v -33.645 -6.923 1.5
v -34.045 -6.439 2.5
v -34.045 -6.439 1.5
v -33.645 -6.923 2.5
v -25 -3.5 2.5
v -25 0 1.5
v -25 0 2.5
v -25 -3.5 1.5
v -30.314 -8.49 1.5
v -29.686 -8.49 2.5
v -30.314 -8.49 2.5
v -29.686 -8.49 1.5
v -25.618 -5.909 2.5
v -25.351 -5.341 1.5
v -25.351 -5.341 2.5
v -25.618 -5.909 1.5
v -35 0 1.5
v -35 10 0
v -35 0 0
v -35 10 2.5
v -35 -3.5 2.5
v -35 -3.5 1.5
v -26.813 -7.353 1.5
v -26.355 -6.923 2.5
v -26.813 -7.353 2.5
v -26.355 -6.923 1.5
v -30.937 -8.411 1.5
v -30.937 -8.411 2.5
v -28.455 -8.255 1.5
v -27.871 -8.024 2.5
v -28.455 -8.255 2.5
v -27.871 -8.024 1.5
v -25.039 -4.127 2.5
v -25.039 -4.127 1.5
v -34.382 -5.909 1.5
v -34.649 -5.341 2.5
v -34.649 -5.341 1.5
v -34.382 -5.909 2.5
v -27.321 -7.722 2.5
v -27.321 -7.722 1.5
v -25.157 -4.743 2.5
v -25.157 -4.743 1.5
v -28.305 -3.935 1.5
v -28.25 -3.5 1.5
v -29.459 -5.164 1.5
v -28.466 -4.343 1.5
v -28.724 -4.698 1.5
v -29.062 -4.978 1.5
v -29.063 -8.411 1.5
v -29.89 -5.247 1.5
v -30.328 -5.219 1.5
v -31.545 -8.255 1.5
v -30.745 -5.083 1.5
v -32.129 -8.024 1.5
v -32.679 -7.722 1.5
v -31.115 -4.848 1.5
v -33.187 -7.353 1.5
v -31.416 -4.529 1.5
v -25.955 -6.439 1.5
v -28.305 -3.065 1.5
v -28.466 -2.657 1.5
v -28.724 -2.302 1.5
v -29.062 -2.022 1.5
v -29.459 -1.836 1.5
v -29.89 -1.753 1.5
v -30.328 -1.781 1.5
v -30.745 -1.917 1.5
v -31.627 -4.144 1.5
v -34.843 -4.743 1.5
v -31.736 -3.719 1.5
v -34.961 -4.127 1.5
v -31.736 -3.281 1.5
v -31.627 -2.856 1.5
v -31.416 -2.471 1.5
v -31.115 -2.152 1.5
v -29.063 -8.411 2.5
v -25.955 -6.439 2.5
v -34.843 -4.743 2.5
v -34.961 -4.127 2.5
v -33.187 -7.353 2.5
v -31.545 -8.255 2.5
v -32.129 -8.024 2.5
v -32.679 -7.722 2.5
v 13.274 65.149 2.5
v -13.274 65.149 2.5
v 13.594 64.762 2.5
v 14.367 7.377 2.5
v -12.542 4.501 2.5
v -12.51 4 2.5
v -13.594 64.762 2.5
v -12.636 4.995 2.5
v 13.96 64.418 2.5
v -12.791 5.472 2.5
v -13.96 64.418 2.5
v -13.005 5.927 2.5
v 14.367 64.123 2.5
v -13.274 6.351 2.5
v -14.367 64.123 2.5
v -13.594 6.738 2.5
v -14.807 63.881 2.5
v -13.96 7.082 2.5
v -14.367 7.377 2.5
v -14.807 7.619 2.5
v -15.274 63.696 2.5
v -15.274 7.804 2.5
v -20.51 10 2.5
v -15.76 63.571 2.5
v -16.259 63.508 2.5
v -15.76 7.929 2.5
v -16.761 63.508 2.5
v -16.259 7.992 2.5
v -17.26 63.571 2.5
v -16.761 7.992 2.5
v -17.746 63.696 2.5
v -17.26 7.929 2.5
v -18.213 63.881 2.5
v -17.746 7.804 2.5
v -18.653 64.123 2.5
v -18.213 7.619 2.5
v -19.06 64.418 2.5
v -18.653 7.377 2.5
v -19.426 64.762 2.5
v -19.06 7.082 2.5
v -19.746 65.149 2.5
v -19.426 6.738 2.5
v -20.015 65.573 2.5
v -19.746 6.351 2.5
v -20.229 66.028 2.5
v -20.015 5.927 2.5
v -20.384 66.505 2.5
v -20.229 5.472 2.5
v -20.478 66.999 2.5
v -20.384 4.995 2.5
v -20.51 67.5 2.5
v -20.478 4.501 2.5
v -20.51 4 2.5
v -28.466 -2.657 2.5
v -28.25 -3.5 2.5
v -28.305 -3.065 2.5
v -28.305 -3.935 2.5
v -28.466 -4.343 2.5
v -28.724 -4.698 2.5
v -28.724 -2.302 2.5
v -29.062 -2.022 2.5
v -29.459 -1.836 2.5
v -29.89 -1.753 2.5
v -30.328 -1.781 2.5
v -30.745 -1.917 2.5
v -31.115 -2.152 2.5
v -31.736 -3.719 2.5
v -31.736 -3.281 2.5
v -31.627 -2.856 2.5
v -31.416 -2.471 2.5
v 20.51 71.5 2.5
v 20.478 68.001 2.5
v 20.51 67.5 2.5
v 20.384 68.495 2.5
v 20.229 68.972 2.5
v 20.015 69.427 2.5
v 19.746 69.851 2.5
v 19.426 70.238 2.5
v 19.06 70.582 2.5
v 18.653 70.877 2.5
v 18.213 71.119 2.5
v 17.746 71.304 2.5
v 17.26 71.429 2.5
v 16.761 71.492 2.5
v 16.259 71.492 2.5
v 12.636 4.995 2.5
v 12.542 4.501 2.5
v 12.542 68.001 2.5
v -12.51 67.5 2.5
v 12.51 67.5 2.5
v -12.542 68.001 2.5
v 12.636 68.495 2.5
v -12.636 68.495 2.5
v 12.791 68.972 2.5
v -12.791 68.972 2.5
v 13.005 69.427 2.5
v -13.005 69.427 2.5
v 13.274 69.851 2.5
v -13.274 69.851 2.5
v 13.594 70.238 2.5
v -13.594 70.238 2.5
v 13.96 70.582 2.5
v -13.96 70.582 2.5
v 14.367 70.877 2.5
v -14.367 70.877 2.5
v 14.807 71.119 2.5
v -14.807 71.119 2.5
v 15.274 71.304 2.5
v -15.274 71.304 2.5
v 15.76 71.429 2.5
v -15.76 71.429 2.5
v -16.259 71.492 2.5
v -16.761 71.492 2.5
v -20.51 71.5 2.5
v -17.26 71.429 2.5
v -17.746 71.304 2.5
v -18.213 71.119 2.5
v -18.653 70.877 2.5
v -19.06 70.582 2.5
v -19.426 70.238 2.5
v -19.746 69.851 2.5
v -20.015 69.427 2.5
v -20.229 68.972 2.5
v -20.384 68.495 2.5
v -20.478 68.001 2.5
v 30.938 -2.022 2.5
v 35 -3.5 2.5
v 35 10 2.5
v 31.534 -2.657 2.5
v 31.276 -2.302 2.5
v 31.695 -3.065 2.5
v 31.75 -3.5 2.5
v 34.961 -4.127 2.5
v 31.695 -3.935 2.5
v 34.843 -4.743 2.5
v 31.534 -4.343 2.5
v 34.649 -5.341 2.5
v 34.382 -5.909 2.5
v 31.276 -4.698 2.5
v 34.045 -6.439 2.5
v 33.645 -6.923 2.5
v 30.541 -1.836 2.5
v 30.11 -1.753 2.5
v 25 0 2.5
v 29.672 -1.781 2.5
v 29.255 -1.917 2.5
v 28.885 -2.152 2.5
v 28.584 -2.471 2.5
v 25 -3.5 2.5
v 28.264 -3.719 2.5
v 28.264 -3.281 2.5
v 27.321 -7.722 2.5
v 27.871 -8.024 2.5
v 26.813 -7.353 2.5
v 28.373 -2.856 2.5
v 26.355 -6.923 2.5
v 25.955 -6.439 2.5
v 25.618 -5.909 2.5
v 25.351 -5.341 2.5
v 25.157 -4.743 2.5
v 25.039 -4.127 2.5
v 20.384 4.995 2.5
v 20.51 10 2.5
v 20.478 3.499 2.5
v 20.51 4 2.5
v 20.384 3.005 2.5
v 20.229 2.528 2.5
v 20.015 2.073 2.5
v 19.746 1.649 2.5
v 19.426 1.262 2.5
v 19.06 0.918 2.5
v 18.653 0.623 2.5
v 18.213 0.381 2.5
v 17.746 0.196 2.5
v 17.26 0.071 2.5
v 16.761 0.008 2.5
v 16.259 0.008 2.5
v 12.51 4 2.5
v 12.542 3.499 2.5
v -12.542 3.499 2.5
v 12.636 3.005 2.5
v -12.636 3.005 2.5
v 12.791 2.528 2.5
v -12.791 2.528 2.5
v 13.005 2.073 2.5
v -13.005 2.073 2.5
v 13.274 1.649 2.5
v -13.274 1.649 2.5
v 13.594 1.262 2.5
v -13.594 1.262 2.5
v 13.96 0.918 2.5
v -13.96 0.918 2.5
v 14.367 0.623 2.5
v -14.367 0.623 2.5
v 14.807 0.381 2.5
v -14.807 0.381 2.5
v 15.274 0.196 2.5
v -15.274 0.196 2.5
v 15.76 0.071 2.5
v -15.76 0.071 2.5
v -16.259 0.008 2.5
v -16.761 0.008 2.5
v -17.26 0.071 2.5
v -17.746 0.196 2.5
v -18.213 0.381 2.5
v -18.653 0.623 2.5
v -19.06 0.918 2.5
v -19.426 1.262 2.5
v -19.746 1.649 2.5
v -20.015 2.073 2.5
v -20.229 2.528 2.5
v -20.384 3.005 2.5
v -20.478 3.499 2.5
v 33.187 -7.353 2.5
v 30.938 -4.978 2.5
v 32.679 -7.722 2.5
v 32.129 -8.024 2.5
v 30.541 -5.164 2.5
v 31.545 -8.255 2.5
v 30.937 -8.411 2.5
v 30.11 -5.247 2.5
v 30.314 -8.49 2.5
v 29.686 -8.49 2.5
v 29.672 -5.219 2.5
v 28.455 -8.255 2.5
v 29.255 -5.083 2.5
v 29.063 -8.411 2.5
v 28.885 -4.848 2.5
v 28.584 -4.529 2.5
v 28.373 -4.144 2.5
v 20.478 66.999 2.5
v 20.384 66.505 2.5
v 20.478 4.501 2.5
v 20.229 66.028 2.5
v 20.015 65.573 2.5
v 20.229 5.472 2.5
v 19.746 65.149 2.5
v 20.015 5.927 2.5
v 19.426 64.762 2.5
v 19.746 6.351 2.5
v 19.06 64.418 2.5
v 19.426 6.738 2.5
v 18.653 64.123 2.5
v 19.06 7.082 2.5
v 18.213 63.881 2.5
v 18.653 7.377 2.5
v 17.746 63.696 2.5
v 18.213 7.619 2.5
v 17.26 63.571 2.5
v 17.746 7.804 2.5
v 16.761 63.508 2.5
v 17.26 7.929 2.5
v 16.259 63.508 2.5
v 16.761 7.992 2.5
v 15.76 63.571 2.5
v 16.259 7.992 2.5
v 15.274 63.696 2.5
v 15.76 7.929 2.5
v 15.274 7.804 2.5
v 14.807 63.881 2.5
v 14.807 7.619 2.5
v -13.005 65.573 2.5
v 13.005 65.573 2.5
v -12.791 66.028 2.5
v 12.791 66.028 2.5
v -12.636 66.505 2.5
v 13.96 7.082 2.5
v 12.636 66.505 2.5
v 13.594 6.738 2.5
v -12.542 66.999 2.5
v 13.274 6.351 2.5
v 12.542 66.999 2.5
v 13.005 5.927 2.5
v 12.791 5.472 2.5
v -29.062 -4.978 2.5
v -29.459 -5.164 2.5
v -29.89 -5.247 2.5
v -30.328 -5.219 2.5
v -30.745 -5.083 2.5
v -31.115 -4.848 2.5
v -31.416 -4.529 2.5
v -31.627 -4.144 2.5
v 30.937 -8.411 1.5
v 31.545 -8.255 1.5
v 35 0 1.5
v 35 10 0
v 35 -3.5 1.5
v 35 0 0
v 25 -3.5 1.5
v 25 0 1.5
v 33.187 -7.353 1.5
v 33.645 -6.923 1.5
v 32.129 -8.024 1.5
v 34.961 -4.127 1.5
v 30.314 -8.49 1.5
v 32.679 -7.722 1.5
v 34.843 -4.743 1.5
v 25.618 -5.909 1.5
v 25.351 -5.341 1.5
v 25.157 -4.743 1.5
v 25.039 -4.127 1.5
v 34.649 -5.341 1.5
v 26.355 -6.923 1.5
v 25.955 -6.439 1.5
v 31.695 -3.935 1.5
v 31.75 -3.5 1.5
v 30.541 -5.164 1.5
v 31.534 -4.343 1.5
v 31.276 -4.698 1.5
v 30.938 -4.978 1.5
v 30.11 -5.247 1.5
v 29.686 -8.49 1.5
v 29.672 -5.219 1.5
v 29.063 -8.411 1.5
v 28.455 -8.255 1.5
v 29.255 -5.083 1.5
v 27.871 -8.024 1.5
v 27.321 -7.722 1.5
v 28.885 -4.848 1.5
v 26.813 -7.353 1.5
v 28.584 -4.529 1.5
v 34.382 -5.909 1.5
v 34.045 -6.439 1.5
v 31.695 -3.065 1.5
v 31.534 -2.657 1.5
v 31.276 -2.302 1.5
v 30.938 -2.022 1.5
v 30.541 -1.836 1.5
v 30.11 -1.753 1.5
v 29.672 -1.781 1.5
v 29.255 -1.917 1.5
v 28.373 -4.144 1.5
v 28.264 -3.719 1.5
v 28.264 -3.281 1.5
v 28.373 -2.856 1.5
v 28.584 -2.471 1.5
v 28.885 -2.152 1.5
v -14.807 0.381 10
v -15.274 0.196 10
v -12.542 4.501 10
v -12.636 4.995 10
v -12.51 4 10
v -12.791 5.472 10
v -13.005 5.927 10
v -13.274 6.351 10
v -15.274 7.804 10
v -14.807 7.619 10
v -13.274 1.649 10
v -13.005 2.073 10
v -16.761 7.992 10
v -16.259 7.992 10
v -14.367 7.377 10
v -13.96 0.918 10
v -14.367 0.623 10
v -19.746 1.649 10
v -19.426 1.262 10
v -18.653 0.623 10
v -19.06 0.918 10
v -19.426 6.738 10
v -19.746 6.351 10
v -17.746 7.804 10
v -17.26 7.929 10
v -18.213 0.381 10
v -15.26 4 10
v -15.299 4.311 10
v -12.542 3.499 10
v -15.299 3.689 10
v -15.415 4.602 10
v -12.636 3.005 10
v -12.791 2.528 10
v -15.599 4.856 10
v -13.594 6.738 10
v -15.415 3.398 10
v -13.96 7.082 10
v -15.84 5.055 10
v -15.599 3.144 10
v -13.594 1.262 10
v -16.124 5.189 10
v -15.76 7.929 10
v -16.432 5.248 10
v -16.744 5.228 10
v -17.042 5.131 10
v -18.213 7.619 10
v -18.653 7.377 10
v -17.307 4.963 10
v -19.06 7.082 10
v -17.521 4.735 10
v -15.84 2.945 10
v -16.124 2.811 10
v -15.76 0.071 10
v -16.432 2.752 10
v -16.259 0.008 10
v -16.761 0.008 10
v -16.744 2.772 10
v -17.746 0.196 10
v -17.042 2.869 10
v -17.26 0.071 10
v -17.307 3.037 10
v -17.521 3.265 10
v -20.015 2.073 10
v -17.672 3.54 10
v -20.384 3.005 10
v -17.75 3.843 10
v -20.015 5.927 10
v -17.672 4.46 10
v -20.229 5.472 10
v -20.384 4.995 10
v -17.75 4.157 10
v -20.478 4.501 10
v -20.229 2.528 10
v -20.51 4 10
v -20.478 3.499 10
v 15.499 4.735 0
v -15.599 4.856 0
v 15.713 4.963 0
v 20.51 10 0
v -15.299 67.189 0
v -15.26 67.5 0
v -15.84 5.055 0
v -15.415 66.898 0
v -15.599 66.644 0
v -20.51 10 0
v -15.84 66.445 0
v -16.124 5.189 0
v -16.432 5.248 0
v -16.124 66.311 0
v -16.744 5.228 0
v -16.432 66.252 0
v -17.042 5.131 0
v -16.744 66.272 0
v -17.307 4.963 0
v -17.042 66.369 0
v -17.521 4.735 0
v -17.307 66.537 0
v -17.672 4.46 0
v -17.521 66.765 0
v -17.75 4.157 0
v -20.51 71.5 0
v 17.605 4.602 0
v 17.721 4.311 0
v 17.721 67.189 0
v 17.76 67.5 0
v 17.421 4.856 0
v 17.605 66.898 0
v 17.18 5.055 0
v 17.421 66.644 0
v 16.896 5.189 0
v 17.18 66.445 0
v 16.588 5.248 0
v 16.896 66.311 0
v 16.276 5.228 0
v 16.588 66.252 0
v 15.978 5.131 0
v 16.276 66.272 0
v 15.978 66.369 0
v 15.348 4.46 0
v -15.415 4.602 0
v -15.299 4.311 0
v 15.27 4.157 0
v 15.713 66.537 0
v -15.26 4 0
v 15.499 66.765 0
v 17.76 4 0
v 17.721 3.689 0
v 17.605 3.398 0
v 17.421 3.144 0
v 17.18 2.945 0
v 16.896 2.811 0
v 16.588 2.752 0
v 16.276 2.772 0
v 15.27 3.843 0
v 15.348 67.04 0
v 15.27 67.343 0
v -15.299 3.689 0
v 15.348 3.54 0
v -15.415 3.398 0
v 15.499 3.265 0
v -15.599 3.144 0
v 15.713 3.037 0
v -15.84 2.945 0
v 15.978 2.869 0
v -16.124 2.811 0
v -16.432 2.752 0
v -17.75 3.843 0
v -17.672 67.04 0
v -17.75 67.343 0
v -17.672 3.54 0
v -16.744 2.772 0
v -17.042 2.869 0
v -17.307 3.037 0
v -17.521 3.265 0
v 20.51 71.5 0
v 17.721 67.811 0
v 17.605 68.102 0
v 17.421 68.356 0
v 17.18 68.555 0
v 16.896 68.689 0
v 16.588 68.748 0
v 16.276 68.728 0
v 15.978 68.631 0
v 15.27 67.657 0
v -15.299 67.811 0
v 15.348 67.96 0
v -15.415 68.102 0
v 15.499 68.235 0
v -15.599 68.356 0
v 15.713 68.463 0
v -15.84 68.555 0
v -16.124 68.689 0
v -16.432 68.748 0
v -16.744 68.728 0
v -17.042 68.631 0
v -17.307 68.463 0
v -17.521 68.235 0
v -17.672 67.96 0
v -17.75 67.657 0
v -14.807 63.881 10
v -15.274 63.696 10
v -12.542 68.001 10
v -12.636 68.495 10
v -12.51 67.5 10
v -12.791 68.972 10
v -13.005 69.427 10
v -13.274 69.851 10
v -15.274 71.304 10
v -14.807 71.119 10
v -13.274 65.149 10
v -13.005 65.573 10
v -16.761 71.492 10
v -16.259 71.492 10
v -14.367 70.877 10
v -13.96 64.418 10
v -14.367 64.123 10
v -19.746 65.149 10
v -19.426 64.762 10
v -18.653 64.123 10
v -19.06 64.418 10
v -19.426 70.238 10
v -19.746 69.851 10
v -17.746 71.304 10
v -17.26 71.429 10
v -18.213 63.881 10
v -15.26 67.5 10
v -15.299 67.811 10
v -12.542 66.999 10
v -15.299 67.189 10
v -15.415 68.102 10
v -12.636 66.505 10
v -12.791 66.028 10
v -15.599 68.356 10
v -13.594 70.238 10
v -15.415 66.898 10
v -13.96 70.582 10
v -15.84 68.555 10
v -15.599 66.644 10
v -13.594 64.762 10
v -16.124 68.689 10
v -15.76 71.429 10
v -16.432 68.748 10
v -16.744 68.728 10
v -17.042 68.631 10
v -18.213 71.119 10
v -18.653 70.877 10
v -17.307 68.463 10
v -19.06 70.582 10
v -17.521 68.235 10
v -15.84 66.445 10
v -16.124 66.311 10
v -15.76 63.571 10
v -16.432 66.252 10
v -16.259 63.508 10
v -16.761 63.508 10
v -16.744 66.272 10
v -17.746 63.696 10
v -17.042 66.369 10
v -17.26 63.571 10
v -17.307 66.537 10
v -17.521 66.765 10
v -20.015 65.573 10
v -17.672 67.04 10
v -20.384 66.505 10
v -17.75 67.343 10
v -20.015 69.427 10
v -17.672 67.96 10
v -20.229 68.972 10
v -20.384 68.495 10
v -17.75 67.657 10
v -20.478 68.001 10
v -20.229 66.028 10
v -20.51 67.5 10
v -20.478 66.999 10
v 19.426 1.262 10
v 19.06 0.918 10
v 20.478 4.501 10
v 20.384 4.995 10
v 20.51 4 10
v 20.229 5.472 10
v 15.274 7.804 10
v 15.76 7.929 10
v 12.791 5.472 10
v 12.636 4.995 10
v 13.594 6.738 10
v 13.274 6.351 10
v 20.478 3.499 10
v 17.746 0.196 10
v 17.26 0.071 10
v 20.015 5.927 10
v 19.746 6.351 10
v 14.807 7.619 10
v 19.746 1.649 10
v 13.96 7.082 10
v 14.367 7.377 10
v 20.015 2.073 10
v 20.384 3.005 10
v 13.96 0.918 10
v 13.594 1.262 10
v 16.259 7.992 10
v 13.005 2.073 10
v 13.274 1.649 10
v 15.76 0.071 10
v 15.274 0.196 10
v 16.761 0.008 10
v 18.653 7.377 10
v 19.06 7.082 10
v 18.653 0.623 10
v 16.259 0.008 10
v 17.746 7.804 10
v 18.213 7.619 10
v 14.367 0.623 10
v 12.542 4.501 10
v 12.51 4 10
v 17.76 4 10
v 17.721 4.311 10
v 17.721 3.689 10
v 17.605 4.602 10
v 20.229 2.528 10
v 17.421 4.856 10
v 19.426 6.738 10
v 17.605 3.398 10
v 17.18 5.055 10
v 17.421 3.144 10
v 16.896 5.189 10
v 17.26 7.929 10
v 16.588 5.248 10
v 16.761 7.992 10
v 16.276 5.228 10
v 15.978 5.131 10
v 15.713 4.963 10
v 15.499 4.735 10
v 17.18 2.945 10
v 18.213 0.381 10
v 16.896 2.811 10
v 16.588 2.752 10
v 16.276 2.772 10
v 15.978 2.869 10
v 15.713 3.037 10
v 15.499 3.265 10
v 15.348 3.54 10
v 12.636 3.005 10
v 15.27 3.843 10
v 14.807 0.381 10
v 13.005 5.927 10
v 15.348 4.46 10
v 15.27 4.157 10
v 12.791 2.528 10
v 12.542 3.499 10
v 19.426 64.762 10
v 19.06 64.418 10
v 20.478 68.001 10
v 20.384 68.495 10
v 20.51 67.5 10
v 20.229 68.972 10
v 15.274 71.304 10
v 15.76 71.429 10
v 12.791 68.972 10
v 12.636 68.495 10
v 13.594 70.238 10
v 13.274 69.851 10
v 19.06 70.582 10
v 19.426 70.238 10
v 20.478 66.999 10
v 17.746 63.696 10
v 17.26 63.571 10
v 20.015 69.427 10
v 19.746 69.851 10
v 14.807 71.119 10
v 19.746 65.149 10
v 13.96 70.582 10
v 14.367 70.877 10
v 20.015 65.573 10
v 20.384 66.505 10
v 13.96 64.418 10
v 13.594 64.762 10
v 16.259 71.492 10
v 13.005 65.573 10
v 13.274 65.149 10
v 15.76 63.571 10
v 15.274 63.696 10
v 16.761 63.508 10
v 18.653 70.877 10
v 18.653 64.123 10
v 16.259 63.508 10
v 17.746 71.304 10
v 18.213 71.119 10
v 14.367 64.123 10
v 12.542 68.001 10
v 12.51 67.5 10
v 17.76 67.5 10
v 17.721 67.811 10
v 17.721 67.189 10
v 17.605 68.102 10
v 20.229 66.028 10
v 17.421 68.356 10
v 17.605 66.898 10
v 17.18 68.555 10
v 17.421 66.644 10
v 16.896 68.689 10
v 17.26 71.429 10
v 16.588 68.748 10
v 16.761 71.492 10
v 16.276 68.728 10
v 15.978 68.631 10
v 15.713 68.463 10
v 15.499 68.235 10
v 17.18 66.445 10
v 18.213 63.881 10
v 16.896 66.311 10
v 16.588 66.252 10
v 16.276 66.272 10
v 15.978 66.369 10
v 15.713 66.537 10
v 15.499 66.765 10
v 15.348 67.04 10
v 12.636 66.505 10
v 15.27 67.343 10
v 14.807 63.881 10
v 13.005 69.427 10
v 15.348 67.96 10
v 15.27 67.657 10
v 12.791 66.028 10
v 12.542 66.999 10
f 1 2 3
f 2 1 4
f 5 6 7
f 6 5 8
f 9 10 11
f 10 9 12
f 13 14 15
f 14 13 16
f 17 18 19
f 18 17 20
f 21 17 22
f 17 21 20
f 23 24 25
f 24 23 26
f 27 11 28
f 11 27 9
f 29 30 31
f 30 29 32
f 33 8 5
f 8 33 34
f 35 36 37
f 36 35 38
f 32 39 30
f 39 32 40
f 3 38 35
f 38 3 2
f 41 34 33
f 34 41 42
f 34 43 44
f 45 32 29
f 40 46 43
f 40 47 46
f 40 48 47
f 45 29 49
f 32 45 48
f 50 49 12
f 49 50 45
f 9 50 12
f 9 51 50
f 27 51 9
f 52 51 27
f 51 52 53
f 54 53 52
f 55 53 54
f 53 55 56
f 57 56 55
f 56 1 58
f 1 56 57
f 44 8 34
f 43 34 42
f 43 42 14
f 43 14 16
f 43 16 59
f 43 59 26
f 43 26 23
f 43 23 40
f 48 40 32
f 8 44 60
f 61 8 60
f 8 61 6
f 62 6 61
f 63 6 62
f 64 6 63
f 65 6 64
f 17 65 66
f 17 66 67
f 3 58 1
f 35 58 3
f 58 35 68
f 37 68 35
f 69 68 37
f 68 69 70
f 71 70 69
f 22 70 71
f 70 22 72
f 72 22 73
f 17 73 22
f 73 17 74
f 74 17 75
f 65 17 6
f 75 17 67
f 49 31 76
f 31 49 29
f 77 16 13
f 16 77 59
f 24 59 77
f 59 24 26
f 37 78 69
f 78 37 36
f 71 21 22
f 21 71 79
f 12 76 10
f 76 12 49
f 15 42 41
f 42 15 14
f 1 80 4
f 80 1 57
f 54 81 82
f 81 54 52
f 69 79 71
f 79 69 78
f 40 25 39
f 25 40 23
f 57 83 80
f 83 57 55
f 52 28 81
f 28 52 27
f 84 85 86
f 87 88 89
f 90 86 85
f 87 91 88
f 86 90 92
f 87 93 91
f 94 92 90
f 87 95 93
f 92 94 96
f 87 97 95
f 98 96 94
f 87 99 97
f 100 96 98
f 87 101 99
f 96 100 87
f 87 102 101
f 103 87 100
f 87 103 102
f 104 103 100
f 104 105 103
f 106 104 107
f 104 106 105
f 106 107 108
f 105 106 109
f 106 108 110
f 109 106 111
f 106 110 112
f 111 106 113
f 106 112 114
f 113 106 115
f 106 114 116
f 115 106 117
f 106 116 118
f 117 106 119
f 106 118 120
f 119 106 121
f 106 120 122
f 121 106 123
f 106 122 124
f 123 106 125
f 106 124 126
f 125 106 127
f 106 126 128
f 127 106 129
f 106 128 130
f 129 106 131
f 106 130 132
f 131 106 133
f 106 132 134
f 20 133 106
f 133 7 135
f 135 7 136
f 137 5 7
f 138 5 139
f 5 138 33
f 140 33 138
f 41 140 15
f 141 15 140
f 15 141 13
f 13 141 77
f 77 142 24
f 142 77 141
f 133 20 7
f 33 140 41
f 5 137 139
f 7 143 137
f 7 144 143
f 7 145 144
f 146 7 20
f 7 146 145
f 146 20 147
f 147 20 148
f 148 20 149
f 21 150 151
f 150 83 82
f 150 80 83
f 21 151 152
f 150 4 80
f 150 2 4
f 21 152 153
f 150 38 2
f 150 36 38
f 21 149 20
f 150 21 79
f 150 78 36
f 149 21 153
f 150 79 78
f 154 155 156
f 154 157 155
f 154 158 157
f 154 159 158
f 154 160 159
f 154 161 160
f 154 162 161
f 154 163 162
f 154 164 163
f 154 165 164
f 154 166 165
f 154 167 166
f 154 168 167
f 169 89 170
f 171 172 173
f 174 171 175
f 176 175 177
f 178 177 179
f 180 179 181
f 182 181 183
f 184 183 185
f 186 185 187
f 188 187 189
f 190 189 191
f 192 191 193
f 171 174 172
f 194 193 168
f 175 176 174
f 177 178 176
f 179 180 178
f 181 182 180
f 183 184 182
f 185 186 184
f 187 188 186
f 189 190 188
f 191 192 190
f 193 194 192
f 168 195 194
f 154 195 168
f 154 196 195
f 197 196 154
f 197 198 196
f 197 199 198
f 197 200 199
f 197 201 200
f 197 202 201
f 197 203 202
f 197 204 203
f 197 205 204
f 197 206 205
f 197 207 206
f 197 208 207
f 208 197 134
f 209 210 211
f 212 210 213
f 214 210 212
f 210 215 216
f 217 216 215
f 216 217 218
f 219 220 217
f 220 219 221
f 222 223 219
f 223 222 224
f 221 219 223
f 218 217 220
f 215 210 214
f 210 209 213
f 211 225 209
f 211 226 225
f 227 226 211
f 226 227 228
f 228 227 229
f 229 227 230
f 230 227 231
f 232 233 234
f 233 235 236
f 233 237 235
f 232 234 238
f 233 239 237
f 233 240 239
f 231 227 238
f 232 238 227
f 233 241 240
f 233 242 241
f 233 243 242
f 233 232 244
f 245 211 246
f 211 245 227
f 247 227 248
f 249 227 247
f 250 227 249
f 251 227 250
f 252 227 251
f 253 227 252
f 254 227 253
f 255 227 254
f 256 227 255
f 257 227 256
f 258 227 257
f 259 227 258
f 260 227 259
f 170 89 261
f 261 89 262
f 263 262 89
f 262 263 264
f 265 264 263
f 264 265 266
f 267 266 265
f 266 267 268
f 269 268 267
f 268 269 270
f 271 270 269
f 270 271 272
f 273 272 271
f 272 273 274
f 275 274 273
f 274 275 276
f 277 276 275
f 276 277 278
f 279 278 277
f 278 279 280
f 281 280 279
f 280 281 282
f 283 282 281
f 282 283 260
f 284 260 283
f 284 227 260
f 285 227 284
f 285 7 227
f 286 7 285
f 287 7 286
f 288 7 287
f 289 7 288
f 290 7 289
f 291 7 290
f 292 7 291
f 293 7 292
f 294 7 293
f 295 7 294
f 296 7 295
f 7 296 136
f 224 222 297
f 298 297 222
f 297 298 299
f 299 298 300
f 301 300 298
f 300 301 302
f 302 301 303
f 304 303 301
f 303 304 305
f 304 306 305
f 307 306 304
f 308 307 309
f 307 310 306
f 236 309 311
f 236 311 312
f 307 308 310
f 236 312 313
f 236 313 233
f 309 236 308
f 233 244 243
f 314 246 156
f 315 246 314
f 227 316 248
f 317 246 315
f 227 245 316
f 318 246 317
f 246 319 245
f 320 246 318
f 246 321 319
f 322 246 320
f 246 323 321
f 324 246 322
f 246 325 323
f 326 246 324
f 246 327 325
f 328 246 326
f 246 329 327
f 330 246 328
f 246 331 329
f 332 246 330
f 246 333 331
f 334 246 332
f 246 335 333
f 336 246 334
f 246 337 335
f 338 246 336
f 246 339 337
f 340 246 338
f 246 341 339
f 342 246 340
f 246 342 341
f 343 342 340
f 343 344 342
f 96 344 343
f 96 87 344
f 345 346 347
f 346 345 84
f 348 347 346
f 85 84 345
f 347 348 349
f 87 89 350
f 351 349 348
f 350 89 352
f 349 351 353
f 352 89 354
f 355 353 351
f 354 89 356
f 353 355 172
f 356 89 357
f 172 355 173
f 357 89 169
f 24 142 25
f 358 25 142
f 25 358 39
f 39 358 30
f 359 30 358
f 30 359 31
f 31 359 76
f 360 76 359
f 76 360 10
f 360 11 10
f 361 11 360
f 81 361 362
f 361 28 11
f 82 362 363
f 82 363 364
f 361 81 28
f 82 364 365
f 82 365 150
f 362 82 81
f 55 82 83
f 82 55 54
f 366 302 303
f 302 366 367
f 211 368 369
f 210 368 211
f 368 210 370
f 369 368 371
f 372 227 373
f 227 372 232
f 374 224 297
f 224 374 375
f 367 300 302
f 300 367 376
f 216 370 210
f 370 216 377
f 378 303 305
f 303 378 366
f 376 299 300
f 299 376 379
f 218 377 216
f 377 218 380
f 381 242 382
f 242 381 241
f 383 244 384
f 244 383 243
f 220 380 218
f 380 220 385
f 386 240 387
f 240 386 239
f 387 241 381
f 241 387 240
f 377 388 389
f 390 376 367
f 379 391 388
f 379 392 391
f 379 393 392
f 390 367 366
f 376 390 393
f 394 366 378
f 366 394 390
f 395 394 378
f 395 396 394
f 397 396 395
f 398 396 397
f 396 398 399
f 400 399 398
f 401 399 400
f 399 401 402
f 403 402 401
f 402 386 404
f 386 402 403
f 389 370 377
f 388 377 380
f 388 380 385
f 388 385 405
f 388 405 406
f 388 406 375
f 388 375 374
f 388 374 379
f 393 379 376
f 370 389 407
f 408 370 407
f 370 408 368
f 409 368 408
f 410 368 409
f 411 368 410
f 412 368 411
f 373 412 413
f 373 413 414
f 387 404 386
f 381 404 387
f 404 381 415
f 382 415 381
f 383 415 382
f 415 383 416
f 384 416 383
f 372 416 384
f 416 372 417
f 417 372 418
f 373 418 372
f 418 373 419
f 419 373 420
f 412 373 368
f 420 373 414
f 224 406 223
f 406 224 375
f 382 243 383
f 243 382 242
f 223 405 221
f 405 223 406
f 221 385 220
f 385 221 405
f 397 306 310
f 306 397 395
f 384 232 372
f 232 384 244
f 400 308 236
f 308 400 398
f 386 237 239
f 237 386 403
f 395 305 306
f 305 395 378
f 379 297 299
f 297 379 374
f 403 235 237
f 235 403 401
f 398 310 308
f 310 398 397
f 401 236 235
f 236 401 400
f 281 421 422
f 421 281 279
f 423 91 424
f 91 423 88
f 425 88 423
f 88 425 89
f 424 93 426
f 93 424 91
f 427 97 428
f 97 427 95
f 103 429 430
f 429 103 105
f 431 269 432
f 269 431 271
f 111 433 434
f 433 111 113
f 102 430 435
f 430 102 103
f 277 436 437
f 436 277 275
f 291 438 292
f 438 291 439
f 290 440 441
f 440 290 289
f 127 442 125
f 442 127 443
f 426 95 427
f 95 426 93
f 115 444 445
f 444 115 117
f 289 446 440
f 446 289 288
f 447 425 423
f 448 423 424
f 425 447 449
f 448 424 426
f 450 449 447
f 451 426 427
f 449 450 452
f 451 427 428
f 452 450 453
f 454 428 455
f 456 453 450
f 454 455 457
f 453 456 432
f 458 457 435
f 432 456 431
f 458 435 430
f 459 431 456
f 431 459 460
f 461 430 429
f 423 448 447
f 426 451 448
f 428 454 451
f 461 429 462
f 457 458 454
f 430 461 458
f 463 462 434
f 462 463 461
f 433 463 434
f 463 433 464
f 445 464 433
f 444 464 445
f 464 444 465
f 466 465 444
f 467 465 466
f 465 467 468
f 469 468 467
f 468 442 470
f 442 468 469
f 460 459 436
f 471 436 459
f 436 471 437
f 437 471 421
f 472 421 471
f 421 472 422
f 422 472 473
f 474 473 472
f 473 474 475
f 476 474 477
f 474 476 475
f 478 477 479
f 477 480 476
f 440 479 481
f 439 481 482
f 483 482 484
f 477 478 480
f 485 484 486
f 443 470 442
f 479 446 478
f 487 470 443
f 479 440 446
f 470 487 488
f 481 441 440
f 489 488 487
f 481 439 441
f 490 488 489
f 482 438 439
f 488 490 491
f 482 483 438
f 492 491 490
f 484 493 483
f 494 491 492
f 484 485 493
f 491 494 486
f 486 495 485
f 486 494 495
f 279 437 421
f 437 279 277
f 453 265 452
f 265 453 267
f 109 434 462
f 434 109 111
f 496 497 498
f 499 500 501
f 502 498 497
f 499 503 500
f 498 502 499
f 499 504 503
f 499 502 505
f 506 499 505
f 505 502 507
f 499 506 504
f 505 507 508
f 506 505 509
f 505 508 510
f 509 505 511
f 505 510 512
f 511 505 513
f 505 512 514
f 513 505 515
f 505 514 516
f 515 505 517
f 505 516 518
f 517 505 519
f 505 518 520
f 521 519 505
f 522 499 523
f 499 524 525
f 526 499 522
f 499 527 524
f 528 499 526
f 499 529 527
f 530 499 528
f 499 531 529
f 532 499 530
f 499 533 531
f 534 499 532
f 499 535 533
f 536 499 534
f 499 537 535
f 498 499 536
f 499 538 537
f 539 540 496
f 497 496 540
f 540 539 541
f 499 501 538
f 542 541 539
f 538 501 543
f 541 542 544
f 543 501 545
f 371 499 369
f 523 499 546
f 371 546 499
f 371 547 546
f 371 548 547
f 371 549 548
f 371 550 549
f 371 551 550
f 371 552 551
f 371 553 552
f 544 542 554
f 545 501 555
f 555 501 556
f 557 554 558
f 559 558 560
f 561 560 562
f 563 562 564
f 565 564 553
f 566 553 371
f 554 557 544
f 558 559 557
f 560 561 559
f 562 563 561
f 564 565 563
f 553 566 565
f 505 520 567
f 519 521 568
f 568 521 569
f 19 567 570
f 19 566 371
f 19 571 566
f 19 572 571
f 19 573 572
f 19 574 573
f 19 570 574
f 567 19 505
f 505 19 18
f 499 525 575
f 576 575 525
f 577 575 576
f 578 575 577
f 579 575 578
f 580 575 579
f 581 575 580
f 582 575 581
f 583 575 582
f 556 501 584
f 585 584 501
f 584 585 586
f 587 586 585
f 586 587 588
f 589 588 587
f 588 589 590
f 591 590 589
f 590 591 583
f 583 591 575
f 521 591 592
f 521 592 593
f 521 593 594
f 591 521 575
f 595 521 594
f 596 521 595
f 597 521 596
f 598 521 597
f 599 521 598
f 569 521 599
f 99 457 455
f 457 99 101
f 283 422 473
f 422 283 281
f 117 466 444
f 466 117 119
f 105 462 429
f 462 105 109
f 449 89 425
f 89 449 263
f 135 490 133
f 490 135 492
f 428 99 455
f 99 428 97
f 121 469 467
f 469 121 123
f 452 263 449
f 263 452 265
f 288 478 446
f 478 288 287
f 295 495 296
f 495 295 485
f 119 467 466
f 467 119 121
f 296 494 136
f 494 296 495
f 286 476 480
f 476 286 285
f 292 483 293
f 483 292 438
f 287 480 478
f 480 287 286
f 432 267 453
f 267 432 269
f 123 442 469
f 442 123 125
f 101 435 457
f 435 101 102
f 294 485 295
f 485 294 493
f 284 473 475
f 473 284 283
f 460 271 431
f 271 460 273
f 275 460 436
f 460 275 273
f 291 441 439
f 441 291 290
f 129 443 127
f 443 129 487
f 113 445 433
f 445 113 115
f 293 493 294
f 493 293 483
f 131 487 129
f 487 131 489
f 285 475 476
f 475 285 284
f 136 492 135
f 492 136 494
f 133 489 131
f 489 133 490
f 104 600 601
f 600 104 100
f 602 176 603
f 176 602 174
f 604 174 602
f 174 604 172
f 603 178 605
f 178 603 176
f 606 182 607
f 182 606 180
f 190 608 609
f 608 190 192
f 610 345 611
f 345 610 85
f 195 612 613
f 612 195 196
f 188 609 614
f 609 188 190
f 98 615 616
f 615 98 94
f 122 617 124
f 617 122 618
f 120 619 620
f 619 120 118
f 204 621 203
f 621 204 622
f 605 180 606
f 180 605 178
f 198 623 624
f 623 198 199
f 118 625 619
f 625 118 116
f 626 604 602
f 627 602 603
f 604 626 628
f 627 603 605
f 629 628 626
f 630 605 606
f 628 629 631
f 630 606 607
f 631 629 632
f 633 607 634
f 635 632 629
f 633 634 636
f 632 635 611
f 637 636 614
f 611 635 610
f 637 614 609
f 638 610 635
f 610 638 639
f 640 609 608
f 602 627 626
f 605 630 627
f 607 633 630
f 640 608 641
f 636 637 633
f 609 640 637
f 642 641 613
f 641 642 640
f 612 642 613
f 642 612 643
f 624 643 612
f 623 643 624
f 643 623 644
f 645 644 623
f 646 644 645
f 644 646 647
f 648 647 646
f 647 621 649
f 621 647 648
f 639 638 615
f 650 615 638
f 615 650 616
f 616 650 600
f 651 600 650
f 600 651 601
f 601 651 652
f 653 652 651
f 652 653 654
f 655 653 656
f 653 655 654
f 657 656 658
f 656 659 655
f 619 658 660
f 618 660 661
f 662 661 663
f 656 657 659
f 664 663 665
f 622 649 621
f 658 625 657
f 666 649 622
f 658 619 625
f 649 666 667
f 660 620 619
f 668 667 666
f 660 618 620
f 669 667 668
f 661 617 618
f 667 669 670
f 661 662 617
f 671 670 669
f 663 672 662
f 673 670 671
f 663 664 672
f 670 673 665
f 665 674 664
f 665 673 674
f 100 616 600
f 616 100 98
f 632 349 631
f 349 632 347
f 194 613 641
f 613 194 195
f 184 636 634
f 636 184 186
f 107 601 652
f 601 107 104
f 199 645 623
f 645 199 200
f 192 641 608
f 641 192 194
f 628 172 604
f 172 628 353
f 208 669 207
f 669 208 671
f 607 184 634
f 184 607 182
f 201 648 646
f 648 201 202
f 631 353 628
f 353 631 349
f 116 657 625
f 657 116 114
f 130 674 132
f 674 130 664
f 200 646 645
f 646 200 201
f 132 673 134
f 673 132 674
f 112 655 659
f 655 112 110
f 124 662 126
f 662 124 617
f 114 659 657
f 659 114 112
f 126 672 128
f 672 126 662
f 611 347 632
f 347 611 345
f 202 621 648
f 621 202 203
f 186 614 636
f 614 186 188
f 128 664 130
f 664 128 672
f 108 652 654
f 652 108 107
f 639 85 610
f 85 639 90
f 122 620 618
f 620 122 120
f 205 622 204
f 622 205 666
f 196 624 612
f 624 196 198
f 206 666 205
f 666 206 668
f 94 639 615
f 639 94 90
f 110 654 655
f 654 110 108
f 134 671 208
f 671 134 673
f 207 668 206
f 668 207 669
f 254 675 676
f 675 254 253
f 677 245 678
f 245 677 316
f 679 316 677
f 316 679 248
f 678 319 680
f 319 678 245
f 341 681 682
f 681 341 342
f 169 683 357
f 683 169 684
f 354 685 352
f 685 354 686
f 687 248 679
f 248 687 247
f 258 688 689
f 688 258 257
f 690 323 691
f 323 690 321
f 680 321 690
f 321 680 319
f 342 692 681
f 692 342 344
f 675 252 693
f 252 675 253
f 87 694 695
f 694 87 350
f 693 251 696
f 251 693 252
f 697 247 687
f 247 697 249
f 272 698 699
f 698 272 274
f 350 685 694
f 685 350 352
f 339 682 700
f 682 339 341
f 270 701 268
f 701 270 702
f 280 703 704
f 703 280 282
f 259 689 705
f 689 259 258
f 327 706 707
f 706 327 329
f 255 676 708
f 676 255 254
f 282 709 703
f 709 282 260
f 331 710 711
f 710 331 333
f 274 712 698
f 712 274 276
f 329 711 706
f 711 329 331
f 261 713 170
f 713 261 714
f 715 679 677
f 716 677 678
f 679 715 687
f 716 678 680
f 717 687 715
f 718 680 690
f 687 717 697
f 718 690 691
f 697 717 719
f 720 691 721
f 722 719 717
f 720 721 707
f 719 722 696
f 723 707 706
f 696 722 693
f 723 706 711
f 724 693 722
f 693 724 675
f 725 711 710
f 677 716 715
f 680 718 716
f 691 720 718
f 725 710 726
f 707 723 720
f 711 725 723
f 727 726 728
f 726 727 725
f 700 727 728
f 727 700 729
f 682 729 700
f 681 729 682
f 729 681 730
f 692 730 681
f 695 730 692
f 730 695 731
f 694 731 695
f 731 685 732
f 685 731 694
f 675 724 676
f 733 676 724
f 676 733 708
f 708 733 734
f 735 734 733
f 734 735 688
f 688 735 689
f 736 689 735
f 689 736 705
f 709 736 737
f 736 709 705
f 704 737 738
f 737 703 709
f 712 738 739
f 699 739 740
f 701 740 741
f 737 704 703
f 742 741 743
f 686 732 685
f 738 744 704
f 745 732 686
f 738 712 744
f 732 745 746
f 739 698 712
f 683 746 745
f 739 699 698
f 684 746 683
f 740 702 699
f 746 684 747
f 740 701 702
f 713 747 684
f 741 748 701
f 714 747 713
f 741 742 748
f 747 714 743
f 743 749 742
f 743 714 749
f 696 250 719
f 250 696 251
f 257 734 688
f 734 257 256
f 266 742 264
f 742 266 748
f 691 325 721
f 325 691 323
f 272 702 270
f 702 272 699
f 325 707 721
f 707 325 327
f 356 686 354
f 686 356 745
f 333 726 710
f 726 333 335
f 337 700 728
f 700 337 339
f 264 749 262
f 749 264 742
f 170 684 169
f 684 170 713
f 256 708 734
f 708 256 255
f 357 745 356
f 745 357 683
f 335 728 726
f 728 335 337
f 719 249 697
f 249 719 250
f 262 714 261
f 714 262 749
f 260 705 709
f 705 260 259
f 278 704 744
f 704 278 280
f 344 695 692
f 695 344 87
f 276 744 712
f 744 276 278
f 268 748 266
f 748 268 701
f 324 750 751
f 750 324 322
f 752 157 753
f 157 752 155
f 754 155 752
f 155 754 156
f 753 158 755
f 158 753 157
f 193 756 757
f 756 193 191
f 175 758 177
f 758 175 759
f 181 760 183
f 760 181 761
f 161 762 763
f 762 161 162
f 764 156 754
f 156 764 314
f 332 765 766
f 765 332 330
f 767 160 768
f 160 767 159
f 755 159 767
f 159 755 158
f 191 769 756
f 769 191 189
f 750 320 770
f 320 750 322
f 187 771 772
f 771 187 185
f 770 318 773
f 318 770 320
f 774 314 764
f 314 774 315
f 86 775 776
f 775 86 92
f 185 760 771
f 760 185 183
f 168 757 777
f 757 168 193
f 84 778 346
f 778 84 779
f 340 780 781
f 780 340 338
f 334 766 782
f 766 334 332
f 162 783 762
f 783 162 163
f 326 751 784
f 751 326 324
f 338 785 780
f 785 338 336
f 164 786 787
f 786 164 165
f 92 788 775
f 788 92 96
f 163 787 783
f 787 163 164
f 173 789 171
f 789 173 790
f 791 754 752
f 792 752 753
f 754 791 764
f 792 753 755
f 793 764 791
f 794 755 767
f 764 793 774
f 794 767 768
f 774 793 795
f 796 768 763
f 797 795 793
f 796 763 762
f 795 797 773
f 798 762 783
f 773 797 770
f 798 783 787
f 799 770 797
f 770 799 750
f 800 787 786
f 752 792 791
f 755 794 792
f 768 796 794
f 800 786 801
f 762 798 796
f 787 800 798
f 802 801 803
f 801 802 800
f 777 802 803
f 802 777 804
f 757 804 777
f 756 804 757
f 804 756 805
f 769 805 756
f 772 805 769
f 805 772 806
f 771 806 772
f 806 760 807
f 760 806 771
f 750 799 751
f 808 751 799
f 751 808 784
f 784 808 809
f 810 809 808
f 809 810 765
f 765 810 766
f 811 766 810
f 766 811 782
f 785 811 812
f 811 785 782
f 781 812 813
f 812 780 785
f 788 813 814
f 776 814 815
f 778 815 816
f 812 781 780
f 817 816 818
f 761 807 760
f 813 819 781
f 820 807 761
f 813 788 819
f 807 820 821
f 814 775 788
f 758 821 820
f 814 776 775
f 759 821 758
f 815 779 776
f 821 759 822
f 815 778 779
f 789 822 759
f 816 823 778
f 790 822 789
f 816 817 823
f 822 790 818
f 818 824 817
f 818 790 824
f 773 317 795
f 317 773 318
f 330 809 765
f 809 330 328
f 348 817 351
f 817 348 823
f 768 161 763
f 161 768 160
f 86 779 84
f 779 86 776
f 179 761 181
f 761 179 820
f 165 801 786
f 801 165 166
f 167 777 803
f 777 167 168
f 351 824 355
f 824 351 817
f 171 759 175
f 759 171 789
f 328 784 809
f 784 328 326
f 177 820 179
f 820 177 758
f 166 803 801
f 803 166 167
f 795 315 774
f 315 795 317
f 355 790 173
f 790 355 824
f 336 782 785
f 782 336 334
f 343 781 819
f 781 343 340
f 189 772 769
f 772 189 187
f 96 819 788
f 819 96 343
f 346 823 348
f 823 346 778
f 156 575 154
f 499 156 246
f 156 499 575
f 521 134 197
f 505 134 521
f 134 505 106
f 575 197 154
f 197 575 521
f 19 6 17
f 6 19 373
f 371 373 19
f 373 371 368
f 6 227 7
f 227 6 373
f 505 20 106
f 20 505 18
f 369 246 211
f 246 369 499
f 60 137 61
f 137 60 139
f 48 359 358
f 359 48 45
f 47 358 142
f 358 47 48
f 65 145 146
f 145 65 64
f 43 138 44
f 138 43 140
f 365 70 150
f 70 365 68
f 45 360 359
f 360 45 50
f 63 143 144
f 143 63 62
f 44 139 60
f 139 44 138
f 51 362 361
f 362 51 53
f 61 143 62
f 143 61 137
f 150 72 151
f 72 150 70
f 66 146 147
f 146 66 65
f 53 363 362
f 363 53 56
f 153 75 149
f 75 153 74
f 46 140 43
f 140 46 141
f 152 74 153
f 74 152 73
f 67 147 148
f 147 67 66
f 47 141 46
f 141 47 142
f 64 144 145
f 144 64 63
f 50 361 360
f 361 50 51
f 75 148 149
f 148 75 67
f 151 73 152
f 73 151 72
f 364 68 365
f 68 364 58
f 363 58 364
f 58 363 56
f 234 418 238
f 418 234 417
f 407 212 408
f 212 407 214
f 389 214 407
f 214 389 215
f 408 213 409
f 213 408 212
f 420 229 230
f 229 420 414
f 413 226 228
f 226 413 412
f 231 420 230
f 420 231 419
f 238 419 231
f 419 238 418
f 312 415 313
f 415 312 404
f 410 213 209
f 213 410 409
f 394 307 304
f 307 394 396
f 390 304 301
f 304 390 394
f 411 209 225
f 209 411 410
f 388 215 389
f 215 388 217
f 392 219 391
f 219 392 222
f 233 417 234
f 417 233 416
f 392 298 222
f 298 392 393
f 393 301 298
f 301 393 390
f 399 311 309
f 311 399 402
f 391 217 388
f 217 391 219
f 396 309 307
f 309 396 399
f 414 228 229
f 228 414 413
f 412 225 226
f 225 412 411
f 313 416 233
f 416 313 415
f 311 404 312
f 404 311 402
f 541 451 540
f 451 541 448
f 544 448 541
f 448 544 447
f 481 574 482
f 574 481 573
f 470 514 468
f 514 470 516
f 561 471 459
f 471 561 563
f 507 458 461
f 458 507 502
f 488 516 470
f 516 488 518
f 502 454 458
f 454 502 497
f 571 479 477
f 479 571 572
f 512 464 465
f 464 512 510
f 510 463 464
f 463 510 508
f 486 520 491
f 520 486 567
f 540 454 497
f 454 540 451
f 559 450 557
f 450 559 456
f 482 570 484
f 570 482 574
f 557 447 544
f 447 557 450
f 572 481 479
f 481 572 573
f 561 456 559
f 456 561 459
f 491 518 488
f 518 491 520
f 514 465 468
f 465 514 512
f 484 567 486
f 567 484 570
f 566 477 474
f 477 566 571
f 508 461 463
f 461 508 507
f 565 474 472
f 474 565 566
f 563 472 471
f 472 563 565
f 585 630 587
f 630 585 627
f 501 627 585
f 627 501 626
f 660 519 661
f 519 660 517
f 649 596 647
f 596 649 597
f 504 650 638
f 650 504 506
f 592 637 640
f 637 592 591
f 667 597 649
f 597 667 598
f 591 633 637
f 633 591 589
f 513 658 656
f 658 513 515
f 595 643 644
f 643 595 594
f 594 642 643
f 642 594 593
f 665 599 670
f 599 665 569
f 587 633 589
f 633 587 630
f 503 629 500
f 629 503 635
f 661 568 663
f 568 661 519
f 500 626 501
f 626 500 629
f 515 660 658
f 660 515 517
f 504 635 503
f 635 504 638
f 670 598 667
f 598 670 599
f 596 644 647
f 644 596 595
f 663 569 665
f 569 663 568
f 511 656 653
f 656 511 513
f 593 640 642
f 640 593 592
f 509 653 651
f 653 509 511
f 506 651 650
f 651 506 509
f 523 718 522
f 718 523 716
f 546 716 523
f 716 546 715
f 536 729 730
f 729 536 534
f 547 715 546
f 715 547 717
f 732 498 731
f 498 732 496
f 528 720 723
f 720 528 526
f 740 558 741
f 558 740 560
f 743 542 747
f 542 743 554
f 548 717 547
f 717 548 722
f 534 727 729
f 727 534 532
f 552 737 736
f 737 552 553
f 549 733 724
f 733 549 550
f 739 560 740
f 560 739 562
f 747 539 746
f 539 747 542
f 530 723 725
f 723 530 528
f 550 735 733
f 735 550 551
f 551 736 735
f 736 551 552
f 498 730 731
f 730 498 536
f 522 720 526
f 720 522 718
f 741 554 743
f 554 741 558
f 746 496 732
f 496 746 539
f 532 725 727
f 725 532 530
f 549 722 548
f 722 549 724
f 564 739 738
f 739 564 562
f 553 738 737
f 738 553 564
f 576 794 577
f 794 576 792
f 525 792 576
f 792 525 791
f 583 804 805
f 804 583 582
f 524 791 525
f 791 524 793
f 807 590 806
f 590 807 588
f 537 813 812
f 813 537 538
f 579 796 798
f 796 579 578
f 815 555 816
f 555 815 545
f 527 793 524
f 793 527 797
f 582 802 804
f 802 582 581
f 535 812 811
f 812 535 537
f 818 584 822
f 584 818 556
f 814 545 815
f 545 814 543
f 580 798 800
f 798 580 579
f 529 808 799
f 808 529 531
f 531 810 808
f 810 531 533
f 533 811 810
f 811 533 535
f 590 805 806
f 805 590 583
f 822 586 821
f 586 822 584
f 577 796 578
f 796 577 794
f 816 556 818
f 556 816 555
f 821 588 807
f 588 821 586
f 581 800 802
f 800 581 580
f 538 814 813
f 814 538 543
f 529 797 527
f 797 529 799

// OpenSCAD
mountingScrewStepHeight = 1.5;
mountingScrewSeparation = 60.0;
mountingScrewRadius = 3.5 / 2;
mountingScrewTabRadius = 10.0 / 2;
mountingScrewStepOffset = 3.5;

basePlateThickness = 2.5;

boardScrewLength = 10.0;
boardScrewRadius = 2.5 / 2;
boardScrewColumnRadius = 8.0 / 2;
boardScrewSeparationX = 33.02;
boardScrewSeparationY = 63.5;


basePlateWidth = boardScrewSeparationX + 2 * boardScrewColumnRadius;
mountingTabSupportWidth = mountingScrewSeparation + 2 * mountingScrewTabRadius;


difference() {
  union() {
    // Base plate
    translate([-basePlateWidth / 2, 0, 0]) {
      cube([basePlateWidth, boardScrewSeparationY + 2 * boardScrewColumnRadius, basePlateThickness]);
    }
    
    // Mounting tab support
    translate([-mountingTabSupportWidth / 2, 0, 0]) {
      cube([mountingTabSupportWidth, mountingScrewTabRadius * 2, basePlateThickness]);
    }
    
    // Mounting tabs
    translate([0, 0, mountingScrewStepHeight]) {
      for (x = [-0.5, 0.5]) {
        translate([x * mountingScrewSeparation, 0, 0]) {
          hull() {
            translate([0, -mountingScrewStepOffset, 0]) {
              cylinder(basePlateThickness - mountingScrewStepHeight, mountingScrewTabRadius, mountingScrewTabRadius, $fn = 50);
            }
            translate([0, mountingScrewTabRadius, 0]) {
              cylinder(basePlateThickness - mountingScrewStepHeight, mountingScrewTabRadius, mountingScrewTabRadius, $fn = 50);
            }
          }
        }
      }
    }
    
    // Board screw columns
    for (x = [-0.5, 0.5]) {
      for (y = [boardScrewColumnRadius, boardScrewColumnRadius + boardScrewSeparationY]) {
        translate([x * boardScrewSeparationX, y, 0]) {
          cylinder(boardScrewLength, boardScrewColumnRadius, boardScrewColumnRadius, $fn = 50);
        }
      }
    }
  }
  
  // Mounting tab holes
  translate([0, 0, mountingScrewStepHeight]) {
    for (x = [-0.5, 0.5]) {
      translate([x * mountingScrewSeparation, 0, 0]) {
        translate([0, -mountingScrewStepOffset, 0]) {
          cylinder(basePlateThickness - mountingScrewStepHeight, mountingScrewRadius, mountingScrewRadius, $fn = 25);
        }
      }
    }
  }
  
  // Board screw column holes
  for (x = [-0.5, 0.5]) {
    for (y = [boardScrewColumnRadius, boardScrewColumnRadius + boardScrewSeparationY]) {
      translate([x * boardScrewSeparationX, y, 0]) {
        cylinder(boardScrewLength, boardScrewRadius, boardScrewRadius, $fn = 25);
      }
    }
  }
}
